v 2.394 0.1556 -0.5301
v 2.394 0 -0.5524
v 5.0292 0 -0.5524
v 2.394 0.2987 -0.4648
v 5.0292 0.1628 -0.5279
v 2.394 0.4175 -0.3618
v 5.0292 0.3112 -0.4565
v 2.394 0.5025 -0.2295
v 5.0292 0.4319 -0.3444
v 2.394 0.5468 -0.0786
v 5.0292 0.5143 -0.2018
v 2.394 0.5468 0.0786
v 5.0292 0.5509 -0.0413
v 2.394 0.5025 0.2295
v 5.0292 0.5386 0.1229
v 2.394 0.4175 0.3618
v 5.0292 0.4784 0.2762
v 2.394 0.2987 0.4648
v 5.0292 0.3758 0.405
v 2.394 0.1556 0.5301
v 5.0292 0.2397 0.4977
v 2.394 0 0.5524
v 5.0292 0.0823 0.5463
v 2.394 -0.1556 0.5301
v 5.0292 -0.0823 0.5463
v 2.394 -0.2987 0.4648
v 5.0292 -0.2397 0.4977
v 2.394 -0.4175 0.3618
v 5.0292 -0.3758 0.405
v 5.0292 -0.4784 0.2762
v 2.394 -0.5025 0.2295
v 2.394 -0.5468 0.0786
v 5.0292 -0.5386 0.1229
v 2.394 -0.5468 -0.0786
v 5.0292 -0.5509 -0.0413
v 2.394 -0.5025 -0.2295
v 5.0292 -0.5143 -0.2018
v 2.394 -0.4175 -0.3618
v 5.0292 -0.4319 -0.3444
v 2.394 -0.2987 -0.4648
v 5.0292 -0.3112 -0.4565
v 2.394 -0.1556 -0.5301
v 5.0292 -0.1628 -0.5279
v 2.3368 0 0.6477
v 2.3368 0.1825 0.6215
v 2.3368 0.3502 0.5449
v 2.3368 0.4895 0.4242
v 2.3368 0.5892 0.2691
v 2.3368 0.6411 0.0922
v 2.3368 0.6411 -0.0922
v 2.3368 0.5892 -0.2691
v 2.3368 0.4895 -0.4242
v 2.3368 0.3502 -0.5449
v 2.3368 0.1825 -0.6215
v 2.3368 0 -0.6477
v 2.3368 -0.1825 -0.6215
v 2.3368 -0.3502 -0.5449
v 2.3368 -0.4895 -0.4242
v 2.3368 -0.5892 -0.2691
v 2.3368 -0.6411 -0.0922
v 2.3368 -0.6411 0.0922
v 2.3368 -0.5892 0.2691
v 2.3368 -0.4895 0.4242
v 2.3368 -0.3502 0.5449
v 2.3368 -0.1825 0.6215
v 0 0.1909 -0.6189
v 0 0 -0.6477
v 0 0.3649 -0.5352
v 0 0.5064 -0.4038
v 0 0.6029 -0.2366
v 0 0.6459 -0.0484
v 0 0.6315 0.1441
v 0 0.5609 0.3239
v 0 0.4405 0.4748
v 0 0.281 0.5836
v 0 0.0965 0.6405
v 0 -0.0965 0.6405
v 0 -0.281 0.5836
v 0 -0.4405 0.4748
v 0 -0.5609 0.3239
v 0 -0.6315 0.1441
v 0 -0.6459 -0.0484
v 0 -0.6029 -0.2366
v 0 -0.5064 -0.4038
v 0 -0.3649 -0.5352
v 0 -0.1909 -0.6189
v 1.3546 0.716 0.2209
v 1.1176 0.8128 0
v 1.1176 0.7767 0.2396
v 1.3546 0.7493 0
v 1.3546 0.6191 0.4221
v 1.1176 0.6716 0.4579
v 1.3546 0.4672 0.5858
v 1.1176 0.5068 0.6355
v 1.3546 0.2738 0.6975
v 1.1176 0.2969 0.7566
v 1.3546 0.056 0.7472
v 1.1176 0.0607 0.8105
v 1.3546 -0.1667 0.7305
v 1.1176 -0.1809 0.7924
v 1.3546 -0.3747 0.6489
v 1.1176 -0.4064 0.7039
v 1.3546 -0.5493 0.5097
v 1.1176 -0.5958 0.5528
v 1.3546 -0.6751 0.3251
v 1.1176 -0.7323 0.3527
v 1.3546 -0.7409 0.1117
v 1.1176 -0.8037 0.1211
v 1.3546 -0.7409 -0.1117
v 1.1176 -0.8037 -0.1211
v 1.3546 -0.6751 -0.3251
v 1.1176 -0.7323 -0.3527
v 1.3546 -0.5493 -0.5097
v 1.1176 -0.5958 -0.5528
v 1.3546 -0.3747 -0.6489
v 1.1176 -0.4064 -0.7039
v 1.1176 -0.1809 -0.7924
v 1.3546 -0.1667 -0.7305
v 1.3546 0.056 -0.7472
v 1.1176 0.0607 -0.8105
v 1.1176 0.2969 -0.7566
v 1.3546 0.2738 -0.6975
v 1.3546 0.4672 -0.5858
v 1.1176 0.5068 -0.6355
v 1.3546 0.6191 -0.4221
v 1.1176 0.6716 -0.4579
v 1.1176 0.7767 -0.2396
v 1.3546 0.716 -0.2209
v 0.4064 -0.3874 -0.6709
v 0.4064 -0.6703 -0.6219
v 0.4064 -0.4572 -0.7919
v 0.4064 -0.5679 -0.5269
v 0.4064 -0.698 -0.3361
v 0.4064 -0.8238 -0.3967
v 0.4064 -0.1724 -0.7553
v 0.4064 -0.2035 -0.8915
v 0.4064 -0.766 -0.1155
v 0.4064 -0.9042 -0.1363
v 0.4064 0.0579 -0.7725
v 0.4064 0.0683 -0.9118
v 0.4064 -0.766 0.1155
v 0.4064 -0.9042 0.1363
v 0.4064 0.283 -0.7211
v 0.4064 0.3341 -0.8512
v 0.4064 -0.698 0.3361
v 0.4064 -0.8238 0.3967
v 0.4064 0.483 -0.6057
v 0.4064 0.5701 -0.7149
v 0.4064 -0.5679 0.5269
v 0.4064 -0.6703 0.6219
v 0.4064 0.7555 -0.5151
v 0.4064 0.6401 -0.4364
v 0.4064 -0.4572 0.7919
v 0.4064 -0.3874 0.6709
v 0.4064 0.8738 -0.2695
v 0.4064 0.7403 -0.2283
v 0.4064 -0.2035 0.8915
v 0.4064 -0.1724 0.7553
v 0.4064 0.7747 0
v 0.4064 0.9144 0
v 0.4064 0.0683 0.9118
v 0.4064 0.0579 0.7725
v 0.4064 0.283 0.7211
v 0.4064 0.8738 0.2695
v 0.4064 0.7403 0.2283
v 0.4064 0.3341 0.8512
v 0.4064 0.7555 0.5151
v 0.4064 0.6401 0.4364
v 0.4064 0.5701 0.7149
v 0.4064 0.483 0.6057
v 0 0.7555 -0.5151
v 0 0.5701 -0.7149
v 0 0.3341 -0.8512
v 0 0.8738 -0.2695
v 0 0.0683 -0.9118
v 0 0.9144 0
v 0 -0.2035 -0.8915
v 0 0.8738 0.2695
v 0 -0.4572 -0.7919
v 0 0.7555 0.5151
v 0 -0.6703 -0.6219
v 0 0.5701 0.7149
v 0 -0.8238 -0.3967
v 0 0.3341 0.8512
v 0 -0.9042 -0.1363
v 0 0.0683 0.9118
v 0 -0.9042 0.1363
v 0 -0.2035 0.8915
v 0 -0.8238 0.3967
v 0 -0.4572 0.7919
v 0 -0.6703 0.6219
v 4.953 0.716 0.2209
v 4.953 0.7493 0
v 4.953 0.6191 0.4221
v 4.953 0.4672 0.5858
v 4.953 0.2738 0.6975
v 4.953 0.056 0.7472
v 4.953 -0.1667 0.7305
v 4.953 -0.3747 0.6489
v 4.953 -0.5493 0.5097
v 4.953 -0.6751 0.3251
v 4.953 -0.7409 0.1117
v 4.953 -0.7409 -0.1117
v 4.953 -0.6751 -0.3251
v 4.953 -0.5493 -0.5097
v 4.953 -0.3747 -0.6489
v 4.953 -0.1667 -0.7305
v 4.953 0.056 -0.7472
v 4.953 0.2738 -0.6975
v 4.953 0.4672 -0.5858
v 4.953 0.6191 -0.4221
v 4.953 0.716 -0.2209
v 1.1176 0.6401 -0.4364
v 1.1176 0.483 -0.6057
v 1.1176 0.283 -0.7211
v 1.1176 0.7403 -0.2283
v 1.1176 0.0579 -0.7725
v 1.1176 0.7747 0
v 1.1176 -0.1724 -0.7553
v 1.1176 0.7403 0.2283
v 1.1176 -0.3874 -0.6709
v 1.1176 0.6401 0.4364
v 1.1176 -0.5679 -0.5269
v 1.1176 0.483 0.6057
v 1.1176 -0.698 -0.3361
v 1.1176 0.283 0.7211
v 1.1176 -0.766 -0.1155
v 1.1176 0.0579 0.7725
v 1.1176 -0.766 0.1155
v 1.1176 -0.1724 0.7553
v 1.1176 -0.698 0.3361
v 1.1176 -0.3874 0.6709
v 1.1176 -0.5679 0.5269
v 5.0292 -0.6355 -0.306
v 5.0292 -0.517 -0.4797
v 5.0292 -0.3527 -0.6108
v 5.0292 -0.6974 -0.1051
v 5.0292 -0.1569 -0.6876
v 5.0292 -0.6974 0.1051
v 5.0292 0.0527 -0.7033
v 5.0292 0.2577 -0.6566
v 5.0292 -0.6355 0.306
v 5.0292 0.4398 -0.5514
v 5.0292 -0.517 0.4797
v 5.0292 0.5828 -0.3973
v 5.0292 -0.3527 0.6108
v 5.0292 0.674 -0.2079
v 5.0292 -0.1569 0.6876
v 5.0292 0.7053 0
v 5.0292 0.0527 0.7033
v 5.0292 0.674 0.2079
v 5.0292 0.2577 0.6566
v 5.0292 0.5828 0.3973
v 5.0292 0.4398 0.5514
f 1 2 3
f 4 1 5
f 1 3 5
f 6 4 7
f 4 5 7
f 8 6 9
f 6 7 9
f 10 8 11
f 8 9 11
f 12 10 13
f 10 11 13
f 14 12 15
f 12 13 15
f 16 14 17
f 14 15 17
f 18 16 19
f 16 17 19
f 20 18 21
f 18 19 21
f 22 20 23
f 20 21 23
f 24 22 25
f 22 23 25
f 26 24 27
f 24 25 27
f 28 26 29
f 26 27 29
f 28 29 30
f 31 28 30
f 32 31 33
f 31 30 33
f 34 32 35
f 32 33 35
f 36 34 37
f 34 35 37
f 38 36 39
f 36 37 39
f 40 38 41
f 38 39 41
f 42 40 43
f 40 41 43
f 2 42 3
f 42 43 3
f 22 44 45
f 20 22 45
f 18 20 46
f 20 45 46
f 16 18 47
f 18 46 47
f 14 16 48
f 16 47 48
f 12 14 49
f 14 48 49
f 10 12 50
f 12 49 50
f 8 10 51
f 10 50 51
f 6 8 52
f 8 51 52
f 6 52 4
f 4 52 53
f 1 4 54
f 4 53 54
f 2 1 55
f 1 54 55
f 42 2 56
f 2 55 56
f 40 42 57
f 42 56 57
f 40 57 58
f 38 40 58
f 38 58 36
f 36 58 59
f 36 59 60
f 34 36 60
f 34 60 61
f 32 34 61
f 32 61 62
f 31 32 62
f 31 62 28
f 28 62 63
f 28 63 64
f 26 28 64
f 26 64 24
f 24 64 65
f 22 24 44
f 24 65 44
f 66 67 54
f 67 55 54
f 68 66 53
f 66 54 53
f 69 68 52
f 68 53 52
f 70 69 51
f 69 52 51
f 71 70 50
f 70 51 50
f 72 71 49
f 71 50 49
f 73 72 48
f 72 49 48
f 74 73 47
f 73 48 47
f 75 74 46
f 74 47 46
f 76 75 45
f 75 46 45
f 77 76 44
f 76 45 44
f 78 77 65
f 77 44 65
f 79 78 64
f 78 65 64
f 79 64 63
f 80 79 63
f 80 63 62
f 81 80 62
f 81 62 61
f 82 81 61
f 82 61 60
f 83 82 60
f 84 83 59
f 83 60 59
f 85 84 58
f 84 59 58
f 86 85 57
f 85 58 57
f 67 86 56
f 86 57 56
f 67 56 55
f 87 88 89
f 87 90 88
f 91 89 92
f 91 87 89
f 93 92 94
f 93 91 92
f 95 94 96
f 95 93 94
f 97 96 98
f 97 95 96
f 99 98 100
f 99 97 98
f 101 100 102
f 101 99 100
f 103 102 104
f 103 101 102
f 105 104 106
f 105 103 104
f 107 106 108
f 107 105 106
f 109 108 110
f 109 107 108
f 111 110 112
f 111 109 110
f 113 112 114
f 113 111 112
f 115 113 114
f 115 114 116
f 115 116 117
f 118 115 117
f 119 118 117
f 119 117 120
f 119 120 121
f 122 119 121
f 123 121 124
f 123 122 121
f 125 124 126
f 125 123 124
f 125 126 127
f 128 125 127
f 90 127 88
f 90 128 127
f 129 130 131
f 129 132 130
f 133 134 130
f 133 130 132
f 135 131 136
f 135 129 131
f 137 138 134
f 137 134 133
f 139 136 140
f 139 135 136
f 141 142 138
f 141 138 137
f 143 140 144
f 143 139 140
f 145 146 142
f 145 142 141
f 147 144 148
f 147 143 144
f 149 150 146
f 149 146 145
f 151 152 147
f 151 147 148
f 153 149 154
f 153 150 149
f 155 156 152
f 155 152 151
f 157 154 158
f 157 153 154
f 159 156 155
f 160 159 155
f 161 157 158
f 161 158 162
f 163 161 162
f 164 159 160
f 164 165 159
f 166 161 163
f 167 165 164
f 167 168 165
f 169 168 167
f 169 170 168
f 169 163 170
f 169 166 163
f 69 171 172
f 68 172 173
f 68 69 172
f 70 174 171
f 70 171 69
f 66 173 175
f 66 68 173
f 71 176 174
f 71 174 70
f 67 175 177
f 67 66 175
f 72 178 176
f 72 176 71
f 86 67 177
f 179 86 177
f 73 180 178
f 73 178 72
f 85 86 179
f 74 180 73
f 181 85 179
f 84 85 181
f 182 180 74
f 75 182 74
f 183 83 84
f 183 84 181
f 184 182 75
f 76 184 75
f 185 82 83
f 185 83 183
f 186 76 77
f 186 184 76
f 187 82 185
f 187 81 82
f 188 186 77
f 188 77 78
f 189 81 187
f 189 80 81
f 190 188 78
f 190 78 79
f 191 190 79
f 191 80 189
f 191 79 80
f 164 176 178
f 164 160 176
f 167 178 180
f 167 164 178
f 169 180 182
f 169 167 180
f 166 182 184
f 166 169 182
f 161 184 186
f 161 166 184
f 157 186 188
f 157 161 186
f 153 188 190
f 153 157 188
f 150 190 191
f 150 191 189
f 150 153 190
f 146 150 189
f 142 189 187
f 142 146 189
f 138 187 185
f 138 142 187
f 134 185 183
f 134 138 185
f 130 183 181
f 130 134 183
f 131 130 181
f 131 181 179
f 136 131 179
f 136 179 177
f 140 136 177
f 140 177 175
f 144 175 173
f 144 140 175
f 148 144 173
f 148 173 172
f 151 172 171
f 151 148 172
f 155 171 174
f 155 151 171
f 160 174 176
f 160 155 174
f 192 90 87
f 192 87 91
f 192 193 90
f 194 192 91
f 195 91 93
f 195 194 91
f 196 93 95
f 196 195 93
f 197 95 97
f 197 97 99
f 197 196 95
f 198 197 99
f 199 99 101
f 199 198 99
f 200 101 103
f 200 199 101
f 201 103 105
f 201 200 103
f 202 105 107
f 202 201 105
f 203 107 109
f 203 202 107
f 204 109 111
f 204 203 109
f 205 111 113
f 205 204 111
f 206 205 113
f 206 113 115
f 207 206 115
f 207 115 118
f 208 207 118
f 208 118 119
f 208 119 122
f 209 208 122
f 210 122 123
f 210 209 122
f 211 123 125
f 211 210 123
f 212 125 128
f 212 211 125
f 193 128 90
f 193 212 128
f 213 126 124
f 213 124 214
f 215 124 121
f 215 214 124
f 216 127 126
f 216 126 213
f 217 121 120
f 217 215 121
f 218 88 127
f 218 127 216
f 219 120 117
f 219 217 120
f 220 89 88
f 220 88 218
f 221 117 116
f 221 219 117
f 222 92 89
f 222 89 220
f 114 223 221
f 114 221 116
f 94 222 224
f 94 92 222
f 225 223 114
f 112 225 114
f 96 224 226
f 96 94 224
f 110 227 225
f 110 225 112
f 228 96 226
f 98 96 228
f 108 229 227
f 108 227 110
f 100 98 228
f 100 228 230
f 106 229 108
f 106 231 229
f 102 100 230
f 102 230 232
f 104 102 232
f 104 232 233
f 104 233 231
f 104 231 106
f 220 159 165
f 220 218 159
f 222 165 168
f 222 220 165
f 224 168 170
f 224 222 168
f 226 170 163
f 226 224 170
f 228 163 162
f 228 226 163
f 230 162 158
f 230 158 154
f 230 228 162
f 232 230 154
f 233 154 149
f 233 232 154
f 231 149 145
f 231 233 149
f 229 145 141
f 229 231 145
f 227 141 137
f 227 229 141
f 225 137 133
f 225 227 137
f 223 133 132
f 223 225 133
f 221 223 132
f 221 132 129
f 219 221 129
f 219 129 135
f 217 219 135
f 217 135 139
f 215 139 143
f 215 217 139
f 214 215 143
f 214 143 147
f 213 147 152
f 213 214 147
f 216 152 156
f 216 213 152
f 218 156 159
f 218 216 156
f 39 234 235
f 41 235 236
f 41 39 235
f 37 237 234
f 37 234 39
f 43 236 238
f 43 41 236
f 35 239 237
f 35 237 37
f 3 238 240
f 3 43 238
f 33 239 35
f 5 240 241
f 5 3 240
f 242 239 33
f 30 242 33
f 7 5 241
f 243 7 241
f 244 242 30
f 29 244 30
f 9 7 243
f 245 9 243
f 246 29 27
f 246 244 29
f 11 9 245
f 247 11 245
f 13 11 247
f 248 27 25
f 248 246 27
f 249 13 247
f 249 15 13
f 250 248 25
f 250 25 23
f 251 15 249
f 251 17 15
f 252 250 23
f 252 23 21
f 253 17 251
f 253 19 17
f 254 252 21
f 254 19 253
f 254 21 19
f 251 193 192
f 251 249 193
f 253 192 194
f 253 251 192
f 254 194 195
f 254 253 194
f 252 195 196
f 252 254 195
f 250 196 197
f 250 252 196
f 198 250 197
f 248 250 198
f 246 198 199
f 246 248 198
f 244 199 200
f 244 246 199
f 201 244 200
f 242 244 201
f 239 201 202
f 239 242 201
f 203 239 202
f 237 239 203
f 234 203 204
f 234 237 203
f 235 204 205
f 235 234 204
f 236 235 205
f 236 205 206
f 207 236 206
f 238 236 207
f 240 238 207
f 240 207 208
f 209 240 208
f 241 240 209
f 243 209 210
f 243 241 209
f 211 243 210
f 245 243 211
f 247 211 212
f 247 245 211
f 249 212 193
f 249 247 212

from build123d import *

# Parameters (mm, degrees)
HOLE1_D     = 1.2954
HOLE1_DEPTH = 2.3368
HOLE1_TIP   = 0.389177423
HOLE2_D     = 1.1049
HOLE2_DEPTH = 5.0292
HOLE2_TIP   = 0.331945449


with BuildPart() as part:
    # Sketch1 → RevolutionAngle1 (revolve)
    with BuildSketch(Plane.XY):
        Polygon((0, 0), (0, 0.9144), (0.4064, 0.9144), (0.4064, 0.7747), (1.1176, 0.7747), (1.1176, 0.8128), (1.354585226, 0.7493), (4.953, 0.7493), (5.0292, 0.705305909), (5.0292, 0), align=None)
    revolve(axis=Axis((0, 0, 0), (1, 0, 0)))

    # Hole1
    with Locations(Plane.ZY):
        with Locations((0, 0)):
            Hole(HOLE1_D / 2, depth=HOLE1_DEPTH)
            with Locations((0, 0, -(HOLE1_DEPTH + HOLE1_TIP / 2))):  # 118° drill point
                Cone(0, HOLE1_D / 2, HOLE1_TIP, mode=Mode.SUBTRACT)

    # Hole2
    with Locations(Plane(origin=(0, 0.341908119, -0.685195276), x_dir=(0, 0, 1), z_dir=(-1, 0, 0))):
        with Locations((0.685195276, -0.341908119)):
            Hole(HOLE2_D / 2, depth=HOLE2_DEPTH)
            with Locations((0, 0, -(HOLE2_DEPTH + HOLE2_TIP / 2))):  # 118° drill point
                Cone(0, HOLE2_D / 2, HOLE2_TIP, mode=Mode.SUBTRACT)


solid = part.part
